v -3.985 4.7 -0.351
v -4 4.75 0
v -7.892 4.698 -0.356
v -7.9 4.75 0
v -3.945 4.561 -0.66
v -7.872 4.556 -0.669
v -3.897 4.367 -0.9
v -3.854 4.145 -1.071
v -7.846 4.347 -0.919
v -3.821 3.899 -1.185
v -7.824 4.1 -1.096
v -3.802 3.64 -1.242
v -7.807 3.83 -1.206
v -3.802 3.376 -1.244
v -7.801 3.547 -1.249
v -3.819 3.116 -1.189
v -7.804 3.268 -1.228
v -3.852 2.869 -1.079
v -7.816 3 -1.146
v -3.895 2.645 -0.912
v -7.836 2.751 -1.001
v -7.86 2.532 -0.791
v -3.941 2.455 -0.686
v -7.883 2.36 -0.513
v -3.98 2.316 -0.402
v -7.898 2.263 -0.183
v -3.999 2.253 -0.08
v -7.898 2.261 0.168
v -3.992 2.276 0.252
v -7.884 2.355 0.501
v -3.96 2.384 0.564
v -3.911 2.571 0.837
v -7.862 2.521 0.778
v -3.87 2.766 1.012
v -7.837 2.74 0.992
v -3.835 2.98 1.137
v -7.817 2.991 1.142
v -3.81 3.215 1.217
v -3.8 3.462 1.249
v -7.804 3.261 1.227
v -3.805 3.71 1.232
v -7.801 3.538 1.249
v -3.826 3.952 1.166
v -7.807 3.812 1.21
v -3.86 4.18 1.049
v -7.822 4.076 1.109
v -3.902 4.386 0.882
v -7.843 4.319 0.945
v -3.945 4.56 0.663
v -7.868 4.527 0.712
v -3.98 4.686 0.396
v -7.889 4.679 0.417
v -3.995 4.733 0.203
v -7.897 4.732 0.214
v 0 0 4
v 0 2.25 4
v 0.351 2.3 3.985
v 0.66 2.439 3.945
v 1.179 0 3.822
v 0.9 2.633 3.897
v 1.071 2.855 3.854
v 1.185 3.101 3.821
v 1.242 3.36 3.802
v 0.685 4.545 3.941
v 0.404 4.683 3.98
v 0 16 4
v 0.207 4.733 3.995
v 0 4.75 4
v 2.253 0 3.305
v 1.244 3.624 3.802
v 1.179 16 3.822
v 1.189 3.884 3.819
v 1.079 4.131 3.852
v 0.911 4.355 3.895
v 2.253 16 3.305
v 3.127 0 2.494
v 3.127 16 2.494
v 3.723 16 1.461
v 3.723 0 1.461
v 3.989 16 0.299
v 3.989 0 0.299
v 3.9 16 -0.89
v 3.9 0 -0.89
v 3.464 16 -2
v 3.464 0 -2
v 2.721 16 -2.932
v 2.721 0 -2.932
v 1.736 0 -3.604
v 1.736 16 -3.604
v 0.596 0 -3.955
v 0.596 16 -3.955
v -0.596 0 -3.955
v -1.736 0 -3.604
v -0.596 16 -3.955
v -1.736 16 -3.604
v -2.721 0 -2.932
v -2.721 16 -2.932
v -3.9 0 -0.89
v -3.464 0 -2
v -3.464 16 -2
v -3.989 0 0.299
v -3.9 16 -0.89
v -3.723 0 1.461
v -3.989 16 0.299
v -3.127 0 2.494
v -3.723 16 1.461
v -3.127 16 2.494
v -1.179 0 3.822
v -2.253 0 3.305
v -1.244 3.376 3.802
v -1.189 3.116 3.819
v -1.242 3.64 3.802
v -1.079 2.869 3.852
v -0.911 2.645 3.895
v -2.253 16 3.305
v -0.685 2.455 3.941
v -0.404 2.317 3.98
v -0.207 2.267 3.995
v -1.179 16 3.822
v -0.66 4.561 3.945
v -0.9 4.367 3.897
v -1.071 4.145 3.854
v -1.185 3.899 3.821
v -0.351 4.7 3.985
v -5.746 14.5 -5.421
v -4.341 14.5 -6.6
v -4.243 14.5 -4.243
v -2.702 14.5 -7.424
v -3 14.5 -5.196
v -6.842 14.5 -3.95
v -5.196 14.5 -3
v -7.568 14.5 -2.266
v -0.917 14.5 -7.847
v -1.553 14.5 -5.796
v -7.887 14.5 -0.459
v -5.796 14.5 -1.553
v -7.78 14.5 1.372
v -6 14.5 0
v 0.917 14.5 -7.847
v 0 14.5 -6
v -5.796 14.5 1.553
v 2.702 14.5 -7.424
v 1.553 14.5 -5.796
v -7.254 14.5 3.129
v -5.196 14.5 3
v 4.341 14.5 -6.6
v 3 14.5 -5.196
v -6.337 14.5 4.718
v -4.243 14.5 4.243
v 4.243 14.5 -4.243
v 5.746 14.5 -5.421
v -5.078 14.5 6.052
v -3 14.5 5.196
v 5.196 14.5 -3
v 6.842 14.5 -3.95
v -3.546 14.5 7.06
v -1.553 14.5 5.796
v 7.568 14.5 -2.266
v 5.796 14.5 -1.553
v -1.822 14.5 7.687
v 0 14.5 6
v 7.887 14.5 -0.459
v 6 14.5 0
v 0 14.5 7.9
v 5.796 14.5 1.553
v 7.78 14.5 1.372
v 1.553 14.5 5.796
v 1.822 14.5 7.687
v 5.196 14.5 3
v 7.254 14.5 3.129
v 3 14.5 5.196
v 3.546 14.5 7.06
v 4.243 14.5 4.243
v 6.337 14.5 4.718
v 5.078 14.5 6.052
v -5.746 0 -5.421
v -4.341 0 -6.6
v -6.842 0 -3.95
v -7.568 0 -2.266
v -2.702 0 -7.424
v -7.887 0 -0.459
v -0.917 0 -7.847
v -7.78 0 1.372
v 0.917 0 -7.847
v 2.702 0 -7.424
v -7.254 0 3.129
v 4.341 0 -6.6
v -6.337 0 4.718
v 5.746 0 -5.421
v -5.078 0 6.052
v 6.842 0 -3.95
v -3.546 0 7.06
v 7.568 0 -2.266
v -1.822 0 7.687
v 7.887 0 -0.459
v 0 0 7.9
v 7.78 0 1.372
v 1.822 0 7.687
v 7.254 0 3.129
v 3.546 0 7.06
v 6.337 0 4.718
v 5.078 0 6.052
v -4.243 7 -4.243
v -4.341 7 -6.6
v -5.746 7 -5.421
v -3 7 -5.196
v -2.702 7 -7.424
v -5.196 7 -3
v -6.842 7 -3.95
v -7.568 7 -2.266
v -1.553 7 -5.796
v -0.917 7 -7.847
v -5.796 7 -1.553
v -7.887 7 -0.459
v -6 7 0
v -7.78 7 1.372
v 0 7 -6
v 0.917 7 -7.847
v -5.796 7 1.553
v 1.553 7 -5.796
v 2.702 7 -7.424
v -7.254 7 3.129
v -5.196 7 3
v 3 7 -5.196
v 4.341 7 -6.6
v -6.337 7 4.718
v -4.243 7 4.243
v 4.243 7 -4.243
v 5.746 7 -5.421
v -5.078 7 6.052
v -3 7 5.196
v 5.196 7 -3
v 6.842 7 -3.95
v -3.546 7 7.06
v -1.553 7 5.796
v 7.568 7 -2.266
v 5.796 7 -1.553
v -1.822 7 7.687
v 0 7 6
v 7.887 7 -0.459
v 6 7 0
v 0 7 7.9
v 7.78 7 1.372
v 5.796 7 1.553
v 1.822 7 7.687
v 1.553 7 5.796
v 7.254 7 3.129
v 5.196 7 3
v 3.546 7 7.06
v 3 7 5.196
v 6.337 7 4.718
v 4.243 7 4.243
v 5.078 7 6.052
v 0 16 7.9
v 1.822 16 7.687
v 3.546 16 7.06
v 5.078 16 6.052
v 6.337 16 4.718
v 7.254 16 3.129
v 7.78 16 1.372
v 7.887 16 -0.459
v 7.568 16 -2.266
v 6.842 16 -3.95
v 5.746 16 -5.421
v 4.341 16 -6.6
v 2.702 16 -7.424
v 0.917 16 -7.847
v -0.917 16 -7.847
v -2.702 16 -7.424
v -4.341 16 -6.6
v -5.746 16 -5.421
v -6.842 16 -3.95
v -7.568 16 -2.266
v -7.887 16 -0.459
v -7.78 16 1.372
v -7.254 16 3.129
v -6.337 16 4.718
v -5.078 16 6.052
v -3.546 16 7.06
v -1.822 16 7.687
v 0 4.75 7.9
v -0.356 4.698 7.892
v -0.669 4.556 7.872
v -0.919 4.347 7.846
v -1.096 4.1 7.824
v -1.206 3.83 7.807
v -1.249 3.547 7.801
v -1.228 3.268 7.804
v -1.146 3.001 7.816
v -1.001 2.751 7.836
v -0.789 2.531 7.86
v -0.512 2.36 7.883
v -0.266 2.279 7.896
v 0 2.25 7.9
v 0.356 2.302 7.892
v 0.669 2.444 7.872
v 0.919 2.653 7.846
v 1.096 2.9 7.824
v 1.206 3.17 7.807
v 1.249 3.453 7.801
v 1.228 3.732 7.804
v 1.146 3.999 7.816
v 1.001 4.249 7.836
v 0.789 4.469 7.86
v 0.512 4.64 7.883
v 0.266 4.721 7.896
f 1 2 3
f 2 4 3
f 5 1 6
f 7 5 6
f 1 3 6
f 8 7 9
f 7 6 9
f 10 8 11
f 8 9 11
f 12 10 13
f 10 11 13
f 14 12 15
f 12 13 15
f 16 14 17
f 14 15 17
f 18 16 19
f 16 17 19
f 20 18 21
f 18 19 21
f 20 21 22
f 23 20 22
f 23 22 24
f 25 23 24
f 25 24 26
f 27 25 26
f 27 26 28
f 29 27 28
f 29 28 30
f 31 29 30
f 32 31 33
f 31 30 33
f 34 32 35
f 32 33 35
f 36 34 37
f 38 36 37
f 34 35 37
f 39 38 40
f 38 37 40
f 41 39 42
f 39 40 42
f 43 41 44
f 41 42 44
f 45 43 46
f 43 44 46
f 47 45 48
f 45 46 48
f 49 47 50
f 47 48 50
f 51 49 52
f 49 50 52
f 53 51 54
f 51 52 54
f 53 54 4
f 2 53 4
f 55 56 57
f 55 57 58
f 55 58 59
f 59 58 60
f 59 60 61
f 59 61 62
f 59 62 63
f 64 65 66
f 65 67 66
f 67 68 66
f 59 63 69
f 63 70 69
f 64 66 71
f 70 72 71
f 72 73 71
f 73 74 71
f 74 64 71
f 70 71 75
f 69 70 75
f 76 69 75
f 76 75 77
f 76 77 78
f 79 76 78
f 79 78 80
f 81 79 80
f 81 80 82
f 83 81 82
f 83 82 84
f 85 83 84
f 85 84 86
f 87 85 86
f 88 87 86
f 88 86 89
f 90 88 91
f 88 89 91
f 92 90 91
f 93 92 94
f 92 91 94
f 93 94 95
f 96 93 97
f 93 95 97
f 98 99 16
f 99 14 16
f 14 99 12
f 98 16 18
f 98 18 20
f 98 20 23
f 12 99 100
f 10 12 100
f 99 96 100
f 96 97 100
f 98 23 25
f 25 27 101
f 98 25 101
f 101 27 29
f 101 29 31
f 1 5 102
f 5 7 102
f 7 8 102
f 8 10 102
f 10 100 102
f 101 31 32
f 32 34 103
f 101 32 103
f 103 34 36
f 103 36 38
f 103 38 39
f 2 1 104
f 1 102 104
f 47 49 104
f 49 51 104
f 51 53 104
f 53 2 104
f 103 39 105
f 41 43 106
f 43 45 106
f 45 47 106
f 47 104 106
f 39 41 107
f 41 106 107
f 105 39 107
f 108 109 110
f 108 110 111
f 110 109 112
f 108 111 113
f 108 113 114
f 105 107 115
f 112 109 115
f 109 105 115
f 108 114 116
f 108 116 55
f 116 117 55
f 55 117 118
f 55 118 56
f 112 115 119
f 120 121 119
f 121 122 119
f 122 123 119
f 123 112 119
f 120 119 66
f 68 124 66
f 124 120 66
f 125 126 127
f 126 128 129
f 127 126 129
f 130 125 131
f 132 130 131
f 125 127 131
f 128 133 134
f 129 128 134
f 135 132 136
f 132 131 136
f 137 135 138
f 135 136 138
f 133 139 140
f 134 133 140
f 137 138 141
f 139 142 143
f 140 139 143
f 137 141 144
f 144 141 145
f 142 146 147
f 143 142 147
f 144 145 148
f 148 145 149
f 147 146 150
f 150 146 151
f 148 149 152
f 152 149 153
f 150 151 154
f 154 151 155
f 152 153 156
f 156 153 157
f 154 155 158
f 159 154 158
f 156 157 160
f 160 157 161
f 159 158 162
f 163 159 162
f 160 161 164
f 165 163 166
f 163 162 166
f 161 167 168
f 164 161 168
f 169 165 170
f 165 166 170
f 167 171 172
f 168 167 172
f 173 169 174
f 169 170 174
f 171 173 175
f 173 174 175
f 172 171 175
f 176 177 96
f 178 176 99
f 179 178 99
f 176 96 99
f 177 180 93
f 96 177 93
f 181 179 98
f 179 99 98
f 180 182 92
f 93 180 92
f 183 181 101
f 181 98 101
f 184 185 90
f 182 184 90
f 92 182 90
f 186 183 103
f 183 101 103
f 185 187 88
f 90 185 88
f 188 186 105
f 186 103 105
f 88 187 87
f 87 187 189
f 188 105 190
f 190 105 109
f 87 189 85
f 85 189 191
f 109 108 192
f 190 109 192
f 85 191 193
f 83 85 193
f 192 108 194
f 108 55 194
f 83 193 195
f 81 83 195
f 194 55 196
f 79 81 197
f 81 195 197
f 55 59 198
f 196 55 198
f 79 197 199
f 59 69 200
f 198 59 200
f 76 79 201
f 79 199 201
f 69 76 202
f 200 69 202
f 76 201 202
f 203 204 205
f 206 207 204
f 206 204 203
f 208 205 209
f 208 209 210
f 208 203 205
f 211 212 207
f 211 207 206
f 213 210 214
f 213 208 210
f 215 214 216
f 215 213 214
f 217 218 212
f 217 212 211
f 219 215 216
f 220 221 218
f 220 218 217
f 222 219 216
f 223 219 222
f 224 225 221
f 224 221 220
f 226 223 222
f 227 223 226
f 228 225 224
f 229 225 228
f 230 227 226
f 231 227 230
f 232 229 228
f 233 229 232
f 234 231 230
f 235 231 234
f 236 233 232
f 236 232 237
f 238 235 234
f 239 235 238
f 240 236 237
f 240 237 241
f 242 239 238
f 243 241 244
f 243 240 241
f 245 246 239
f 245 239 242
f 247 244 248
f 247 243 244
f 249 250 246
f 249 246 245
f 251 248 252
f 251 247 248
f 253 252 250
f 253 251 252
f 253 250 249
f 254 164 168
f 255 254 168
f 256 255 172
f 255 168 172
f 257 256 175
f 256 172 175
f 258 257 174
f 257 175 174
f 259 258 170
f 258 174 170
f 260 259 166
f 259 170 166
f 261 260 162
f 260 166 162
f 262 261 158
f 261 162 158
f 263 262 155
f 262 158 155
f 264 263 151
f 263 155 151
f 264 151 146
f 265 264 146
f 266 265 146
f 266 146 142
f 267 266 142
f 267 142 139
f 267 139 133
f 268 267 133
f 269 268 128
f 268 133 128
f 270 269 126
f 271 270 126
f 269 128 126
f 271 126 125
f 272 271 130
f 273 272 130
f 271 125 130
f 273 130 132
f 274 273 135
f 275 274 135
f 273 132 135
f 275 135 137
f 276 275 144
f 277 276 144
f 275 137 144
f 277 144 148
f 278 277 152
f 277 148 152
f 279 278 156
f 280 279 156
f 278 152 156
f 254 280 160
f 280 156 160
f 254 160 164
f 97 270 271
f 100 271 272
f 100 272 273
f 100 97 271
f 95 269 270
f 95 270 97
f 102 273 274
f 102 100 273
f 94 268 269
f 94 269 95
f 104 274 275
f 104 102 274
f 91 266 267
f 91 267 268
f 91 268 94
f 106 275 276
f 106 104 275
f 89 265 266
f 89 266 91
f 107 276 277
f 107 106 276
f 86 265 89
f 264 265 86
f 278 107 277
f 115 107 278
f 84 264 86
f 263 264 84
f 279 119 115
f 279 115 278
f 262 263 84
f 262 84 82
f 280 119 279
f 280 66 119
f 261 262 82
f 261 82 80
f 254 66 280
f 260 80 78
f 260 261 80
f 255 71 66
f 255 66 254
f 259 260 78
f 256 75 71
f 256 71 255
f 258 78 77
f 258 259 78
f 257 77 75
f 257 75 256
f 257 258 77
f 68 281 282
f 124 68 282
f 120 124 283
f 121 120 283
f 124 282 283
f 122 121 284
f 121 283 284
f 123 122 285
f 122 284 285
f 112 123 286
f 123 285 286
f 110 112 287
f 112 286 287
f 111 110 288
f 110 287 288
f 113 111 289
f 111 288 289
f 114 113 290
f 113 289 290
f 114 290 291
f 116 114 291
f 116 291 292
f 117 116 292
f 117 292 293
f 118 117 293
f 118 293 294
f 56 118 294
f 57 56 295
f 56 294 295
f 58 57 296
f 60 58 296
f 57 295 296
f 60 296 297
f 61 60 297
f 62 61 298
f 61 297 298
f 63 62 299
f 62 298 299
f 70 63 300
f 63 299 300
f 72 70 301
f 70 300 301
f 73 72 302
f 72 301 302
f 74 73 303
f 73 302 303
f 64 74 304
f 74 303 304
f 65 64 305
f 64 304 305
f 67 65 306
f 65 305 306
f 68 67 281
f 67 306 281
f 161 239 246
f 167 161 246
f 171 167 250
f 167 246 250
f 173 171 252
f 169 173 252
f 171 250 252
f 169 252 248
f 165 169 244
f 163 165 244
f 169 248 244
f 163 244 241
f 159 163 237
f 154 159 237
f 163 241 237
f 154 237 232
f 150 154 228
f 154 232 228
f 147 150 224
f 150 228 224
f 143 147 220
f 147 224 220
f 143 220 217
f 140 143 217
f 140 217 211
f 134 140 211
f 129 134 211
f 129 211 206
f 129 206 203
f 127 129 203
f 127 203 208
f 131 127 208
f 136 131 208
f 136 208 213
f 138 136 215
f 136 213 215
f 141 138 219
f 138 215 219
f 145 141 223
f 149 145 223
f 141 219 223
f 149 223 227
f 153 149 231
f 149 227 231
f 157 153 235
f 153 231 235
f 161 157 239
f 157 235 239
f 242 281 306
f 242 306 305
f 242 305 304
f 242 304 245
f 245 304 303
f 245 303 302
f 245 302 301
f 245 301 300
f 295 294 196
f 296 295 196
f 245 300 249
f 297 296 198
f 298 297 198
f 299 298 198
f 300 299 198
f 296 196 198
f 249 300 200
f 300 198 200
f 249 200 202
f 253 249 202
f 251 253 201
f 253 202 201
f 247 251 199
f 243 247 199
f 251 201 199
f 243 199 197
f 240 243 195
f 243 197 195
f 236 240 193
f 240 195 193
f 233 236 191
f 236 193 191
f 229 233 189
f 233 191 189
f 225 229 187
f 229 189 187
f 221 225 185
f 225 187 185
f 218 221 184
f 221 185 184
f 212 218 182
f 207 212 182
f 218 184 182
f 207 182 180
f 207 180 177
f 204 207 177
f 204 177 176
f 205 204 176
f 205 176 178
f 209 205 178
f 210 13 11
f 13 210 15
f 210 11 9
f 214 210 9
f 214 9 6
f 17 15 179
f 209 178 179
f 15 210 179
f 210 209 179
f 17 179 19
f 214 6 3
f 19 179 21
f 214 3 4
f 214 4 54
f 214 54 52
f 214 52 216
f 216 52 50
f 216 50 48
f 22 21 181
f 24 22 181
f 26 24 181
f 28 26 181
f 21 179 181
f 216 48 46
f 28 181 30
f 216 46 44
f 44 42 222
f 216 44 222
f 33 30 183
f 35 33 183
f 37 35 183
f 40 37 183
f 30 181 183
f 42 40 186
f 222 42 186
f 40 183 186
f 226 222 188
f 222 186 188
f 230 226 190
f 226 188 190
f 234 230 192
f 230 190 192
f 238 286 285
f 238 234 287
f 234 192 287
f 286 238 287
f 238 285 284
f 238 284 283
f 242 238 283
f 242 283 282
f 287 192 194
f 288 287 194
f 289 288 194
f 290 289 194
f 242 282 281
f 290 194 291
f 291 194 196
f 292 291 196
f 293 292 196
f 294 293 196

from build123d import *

# Parameters (mm, degrees)
CROQUIS1_R              = 7.9
SALIENTE_EXTRUIR1_DEPTH = 7
CROQUIS2_R              = 6
SALIENTE_EXTRUIR2_DEPTH = 7.5
CROQUIS3_R              = 7.9
SALIENTE_EXTRUIR3_DEPTH = 1.5
CROQUIS4_R              = 4
CORTAR_EXTRUIR1_DEPTH   = 20.514609912
CROQUIS5_W              = 1.25
CROQUIS5_H              = 7.901
MATRIZC1_COUNT          = 2
MATRIZC1_ANGLE          = 90


with BuildPart() as part:
    # Croquis1 → Saliente-Extruir1 (new body)
    with BuildSketch(Plane(origin=(0, 0, 0), x_dir=(1, 0, 0), z_dir=(0, 1, 0))):
        with Locations(Location((0, 0, 0), (0, 0, 270))):
            Circle(CROQUIS1_R)
    extrude(amount=SALIENTE_EXTRUIR1_DEPTH)

    # Croquis2 → Saliente-Extruir2 (add)
    with BuildSketch(Plane(origin=(0, 7, 0), x_dir=(1, 0, 0), z_dir=(0, 1, 0))):
        with Locations(Location((0, 0, 0), (0, 0, 270))):
            Circle(CROQUIS2_R)
    extrude(amount=SALIENTE_EXTRUIR2_DEPTH)

    # Croquis3 → Saliente-Extruir3 (add)
    with BuildSketch(Plane(origin=(0, 14.5, 0), x_dir=(1, 0, 0), z_dir=(0, 1, 0))):
        with Locations(Location((0, 0, 0), (0, 0, 270))):
            Circle(CROQUIS3_R)
    extrude(amount=SALIENTE_EXTRUIR3_DEPTH)

    # Croquis4 → Cortar-Extruir1 (cut, through all)
    with BuildSketch(Plane(origin=(0, 16, 0), x_dir=(1, 0, 0), z_dir=(0, 1, 0))):
        with Locations(Location((0, 0, 0), (0, 0, 270))):
            Circle(CROQUIS4_R)
    extrude(amount=-CORTAR_EXTRUIR1_DEPTH, mode=Mode.SUBTRACT)

    # Croquis5 → Taladro roscado M31 (definir posicio) (revolve, cut)
    with BuildSketch(Plane(origin=(0, 3.5, 0), x_dir=(0, 1, 0), z_dir=(1, 0, 0))):
        with Locations((0.625, 3.9505)):
            Rectangle(CROQUIS5_W, CROQUIS5_H)
    taladro_roscado_m31_definir_posicio = revolve(axis=Axis((0, 3.5, -6.35), (0, 0, 1)), mode=Mode.SUBTRACT)

    # MatrizC1: Taladro roscado M31 (definir posicio) ×2 about axis
    matrizc1_axis = Axis((0, 7, 0), (0, -1, 0))
    for i in range(1, MATRIZC1_COUNT):
        add(taladro_roscado_m31_definir_posicio.rotate(matrizc1_axis, i * MATRIZC1_ANGLE / (MATRIZC1_COUNT - 1)), mode=Mode.SUBTRACT)


solid = part.part
